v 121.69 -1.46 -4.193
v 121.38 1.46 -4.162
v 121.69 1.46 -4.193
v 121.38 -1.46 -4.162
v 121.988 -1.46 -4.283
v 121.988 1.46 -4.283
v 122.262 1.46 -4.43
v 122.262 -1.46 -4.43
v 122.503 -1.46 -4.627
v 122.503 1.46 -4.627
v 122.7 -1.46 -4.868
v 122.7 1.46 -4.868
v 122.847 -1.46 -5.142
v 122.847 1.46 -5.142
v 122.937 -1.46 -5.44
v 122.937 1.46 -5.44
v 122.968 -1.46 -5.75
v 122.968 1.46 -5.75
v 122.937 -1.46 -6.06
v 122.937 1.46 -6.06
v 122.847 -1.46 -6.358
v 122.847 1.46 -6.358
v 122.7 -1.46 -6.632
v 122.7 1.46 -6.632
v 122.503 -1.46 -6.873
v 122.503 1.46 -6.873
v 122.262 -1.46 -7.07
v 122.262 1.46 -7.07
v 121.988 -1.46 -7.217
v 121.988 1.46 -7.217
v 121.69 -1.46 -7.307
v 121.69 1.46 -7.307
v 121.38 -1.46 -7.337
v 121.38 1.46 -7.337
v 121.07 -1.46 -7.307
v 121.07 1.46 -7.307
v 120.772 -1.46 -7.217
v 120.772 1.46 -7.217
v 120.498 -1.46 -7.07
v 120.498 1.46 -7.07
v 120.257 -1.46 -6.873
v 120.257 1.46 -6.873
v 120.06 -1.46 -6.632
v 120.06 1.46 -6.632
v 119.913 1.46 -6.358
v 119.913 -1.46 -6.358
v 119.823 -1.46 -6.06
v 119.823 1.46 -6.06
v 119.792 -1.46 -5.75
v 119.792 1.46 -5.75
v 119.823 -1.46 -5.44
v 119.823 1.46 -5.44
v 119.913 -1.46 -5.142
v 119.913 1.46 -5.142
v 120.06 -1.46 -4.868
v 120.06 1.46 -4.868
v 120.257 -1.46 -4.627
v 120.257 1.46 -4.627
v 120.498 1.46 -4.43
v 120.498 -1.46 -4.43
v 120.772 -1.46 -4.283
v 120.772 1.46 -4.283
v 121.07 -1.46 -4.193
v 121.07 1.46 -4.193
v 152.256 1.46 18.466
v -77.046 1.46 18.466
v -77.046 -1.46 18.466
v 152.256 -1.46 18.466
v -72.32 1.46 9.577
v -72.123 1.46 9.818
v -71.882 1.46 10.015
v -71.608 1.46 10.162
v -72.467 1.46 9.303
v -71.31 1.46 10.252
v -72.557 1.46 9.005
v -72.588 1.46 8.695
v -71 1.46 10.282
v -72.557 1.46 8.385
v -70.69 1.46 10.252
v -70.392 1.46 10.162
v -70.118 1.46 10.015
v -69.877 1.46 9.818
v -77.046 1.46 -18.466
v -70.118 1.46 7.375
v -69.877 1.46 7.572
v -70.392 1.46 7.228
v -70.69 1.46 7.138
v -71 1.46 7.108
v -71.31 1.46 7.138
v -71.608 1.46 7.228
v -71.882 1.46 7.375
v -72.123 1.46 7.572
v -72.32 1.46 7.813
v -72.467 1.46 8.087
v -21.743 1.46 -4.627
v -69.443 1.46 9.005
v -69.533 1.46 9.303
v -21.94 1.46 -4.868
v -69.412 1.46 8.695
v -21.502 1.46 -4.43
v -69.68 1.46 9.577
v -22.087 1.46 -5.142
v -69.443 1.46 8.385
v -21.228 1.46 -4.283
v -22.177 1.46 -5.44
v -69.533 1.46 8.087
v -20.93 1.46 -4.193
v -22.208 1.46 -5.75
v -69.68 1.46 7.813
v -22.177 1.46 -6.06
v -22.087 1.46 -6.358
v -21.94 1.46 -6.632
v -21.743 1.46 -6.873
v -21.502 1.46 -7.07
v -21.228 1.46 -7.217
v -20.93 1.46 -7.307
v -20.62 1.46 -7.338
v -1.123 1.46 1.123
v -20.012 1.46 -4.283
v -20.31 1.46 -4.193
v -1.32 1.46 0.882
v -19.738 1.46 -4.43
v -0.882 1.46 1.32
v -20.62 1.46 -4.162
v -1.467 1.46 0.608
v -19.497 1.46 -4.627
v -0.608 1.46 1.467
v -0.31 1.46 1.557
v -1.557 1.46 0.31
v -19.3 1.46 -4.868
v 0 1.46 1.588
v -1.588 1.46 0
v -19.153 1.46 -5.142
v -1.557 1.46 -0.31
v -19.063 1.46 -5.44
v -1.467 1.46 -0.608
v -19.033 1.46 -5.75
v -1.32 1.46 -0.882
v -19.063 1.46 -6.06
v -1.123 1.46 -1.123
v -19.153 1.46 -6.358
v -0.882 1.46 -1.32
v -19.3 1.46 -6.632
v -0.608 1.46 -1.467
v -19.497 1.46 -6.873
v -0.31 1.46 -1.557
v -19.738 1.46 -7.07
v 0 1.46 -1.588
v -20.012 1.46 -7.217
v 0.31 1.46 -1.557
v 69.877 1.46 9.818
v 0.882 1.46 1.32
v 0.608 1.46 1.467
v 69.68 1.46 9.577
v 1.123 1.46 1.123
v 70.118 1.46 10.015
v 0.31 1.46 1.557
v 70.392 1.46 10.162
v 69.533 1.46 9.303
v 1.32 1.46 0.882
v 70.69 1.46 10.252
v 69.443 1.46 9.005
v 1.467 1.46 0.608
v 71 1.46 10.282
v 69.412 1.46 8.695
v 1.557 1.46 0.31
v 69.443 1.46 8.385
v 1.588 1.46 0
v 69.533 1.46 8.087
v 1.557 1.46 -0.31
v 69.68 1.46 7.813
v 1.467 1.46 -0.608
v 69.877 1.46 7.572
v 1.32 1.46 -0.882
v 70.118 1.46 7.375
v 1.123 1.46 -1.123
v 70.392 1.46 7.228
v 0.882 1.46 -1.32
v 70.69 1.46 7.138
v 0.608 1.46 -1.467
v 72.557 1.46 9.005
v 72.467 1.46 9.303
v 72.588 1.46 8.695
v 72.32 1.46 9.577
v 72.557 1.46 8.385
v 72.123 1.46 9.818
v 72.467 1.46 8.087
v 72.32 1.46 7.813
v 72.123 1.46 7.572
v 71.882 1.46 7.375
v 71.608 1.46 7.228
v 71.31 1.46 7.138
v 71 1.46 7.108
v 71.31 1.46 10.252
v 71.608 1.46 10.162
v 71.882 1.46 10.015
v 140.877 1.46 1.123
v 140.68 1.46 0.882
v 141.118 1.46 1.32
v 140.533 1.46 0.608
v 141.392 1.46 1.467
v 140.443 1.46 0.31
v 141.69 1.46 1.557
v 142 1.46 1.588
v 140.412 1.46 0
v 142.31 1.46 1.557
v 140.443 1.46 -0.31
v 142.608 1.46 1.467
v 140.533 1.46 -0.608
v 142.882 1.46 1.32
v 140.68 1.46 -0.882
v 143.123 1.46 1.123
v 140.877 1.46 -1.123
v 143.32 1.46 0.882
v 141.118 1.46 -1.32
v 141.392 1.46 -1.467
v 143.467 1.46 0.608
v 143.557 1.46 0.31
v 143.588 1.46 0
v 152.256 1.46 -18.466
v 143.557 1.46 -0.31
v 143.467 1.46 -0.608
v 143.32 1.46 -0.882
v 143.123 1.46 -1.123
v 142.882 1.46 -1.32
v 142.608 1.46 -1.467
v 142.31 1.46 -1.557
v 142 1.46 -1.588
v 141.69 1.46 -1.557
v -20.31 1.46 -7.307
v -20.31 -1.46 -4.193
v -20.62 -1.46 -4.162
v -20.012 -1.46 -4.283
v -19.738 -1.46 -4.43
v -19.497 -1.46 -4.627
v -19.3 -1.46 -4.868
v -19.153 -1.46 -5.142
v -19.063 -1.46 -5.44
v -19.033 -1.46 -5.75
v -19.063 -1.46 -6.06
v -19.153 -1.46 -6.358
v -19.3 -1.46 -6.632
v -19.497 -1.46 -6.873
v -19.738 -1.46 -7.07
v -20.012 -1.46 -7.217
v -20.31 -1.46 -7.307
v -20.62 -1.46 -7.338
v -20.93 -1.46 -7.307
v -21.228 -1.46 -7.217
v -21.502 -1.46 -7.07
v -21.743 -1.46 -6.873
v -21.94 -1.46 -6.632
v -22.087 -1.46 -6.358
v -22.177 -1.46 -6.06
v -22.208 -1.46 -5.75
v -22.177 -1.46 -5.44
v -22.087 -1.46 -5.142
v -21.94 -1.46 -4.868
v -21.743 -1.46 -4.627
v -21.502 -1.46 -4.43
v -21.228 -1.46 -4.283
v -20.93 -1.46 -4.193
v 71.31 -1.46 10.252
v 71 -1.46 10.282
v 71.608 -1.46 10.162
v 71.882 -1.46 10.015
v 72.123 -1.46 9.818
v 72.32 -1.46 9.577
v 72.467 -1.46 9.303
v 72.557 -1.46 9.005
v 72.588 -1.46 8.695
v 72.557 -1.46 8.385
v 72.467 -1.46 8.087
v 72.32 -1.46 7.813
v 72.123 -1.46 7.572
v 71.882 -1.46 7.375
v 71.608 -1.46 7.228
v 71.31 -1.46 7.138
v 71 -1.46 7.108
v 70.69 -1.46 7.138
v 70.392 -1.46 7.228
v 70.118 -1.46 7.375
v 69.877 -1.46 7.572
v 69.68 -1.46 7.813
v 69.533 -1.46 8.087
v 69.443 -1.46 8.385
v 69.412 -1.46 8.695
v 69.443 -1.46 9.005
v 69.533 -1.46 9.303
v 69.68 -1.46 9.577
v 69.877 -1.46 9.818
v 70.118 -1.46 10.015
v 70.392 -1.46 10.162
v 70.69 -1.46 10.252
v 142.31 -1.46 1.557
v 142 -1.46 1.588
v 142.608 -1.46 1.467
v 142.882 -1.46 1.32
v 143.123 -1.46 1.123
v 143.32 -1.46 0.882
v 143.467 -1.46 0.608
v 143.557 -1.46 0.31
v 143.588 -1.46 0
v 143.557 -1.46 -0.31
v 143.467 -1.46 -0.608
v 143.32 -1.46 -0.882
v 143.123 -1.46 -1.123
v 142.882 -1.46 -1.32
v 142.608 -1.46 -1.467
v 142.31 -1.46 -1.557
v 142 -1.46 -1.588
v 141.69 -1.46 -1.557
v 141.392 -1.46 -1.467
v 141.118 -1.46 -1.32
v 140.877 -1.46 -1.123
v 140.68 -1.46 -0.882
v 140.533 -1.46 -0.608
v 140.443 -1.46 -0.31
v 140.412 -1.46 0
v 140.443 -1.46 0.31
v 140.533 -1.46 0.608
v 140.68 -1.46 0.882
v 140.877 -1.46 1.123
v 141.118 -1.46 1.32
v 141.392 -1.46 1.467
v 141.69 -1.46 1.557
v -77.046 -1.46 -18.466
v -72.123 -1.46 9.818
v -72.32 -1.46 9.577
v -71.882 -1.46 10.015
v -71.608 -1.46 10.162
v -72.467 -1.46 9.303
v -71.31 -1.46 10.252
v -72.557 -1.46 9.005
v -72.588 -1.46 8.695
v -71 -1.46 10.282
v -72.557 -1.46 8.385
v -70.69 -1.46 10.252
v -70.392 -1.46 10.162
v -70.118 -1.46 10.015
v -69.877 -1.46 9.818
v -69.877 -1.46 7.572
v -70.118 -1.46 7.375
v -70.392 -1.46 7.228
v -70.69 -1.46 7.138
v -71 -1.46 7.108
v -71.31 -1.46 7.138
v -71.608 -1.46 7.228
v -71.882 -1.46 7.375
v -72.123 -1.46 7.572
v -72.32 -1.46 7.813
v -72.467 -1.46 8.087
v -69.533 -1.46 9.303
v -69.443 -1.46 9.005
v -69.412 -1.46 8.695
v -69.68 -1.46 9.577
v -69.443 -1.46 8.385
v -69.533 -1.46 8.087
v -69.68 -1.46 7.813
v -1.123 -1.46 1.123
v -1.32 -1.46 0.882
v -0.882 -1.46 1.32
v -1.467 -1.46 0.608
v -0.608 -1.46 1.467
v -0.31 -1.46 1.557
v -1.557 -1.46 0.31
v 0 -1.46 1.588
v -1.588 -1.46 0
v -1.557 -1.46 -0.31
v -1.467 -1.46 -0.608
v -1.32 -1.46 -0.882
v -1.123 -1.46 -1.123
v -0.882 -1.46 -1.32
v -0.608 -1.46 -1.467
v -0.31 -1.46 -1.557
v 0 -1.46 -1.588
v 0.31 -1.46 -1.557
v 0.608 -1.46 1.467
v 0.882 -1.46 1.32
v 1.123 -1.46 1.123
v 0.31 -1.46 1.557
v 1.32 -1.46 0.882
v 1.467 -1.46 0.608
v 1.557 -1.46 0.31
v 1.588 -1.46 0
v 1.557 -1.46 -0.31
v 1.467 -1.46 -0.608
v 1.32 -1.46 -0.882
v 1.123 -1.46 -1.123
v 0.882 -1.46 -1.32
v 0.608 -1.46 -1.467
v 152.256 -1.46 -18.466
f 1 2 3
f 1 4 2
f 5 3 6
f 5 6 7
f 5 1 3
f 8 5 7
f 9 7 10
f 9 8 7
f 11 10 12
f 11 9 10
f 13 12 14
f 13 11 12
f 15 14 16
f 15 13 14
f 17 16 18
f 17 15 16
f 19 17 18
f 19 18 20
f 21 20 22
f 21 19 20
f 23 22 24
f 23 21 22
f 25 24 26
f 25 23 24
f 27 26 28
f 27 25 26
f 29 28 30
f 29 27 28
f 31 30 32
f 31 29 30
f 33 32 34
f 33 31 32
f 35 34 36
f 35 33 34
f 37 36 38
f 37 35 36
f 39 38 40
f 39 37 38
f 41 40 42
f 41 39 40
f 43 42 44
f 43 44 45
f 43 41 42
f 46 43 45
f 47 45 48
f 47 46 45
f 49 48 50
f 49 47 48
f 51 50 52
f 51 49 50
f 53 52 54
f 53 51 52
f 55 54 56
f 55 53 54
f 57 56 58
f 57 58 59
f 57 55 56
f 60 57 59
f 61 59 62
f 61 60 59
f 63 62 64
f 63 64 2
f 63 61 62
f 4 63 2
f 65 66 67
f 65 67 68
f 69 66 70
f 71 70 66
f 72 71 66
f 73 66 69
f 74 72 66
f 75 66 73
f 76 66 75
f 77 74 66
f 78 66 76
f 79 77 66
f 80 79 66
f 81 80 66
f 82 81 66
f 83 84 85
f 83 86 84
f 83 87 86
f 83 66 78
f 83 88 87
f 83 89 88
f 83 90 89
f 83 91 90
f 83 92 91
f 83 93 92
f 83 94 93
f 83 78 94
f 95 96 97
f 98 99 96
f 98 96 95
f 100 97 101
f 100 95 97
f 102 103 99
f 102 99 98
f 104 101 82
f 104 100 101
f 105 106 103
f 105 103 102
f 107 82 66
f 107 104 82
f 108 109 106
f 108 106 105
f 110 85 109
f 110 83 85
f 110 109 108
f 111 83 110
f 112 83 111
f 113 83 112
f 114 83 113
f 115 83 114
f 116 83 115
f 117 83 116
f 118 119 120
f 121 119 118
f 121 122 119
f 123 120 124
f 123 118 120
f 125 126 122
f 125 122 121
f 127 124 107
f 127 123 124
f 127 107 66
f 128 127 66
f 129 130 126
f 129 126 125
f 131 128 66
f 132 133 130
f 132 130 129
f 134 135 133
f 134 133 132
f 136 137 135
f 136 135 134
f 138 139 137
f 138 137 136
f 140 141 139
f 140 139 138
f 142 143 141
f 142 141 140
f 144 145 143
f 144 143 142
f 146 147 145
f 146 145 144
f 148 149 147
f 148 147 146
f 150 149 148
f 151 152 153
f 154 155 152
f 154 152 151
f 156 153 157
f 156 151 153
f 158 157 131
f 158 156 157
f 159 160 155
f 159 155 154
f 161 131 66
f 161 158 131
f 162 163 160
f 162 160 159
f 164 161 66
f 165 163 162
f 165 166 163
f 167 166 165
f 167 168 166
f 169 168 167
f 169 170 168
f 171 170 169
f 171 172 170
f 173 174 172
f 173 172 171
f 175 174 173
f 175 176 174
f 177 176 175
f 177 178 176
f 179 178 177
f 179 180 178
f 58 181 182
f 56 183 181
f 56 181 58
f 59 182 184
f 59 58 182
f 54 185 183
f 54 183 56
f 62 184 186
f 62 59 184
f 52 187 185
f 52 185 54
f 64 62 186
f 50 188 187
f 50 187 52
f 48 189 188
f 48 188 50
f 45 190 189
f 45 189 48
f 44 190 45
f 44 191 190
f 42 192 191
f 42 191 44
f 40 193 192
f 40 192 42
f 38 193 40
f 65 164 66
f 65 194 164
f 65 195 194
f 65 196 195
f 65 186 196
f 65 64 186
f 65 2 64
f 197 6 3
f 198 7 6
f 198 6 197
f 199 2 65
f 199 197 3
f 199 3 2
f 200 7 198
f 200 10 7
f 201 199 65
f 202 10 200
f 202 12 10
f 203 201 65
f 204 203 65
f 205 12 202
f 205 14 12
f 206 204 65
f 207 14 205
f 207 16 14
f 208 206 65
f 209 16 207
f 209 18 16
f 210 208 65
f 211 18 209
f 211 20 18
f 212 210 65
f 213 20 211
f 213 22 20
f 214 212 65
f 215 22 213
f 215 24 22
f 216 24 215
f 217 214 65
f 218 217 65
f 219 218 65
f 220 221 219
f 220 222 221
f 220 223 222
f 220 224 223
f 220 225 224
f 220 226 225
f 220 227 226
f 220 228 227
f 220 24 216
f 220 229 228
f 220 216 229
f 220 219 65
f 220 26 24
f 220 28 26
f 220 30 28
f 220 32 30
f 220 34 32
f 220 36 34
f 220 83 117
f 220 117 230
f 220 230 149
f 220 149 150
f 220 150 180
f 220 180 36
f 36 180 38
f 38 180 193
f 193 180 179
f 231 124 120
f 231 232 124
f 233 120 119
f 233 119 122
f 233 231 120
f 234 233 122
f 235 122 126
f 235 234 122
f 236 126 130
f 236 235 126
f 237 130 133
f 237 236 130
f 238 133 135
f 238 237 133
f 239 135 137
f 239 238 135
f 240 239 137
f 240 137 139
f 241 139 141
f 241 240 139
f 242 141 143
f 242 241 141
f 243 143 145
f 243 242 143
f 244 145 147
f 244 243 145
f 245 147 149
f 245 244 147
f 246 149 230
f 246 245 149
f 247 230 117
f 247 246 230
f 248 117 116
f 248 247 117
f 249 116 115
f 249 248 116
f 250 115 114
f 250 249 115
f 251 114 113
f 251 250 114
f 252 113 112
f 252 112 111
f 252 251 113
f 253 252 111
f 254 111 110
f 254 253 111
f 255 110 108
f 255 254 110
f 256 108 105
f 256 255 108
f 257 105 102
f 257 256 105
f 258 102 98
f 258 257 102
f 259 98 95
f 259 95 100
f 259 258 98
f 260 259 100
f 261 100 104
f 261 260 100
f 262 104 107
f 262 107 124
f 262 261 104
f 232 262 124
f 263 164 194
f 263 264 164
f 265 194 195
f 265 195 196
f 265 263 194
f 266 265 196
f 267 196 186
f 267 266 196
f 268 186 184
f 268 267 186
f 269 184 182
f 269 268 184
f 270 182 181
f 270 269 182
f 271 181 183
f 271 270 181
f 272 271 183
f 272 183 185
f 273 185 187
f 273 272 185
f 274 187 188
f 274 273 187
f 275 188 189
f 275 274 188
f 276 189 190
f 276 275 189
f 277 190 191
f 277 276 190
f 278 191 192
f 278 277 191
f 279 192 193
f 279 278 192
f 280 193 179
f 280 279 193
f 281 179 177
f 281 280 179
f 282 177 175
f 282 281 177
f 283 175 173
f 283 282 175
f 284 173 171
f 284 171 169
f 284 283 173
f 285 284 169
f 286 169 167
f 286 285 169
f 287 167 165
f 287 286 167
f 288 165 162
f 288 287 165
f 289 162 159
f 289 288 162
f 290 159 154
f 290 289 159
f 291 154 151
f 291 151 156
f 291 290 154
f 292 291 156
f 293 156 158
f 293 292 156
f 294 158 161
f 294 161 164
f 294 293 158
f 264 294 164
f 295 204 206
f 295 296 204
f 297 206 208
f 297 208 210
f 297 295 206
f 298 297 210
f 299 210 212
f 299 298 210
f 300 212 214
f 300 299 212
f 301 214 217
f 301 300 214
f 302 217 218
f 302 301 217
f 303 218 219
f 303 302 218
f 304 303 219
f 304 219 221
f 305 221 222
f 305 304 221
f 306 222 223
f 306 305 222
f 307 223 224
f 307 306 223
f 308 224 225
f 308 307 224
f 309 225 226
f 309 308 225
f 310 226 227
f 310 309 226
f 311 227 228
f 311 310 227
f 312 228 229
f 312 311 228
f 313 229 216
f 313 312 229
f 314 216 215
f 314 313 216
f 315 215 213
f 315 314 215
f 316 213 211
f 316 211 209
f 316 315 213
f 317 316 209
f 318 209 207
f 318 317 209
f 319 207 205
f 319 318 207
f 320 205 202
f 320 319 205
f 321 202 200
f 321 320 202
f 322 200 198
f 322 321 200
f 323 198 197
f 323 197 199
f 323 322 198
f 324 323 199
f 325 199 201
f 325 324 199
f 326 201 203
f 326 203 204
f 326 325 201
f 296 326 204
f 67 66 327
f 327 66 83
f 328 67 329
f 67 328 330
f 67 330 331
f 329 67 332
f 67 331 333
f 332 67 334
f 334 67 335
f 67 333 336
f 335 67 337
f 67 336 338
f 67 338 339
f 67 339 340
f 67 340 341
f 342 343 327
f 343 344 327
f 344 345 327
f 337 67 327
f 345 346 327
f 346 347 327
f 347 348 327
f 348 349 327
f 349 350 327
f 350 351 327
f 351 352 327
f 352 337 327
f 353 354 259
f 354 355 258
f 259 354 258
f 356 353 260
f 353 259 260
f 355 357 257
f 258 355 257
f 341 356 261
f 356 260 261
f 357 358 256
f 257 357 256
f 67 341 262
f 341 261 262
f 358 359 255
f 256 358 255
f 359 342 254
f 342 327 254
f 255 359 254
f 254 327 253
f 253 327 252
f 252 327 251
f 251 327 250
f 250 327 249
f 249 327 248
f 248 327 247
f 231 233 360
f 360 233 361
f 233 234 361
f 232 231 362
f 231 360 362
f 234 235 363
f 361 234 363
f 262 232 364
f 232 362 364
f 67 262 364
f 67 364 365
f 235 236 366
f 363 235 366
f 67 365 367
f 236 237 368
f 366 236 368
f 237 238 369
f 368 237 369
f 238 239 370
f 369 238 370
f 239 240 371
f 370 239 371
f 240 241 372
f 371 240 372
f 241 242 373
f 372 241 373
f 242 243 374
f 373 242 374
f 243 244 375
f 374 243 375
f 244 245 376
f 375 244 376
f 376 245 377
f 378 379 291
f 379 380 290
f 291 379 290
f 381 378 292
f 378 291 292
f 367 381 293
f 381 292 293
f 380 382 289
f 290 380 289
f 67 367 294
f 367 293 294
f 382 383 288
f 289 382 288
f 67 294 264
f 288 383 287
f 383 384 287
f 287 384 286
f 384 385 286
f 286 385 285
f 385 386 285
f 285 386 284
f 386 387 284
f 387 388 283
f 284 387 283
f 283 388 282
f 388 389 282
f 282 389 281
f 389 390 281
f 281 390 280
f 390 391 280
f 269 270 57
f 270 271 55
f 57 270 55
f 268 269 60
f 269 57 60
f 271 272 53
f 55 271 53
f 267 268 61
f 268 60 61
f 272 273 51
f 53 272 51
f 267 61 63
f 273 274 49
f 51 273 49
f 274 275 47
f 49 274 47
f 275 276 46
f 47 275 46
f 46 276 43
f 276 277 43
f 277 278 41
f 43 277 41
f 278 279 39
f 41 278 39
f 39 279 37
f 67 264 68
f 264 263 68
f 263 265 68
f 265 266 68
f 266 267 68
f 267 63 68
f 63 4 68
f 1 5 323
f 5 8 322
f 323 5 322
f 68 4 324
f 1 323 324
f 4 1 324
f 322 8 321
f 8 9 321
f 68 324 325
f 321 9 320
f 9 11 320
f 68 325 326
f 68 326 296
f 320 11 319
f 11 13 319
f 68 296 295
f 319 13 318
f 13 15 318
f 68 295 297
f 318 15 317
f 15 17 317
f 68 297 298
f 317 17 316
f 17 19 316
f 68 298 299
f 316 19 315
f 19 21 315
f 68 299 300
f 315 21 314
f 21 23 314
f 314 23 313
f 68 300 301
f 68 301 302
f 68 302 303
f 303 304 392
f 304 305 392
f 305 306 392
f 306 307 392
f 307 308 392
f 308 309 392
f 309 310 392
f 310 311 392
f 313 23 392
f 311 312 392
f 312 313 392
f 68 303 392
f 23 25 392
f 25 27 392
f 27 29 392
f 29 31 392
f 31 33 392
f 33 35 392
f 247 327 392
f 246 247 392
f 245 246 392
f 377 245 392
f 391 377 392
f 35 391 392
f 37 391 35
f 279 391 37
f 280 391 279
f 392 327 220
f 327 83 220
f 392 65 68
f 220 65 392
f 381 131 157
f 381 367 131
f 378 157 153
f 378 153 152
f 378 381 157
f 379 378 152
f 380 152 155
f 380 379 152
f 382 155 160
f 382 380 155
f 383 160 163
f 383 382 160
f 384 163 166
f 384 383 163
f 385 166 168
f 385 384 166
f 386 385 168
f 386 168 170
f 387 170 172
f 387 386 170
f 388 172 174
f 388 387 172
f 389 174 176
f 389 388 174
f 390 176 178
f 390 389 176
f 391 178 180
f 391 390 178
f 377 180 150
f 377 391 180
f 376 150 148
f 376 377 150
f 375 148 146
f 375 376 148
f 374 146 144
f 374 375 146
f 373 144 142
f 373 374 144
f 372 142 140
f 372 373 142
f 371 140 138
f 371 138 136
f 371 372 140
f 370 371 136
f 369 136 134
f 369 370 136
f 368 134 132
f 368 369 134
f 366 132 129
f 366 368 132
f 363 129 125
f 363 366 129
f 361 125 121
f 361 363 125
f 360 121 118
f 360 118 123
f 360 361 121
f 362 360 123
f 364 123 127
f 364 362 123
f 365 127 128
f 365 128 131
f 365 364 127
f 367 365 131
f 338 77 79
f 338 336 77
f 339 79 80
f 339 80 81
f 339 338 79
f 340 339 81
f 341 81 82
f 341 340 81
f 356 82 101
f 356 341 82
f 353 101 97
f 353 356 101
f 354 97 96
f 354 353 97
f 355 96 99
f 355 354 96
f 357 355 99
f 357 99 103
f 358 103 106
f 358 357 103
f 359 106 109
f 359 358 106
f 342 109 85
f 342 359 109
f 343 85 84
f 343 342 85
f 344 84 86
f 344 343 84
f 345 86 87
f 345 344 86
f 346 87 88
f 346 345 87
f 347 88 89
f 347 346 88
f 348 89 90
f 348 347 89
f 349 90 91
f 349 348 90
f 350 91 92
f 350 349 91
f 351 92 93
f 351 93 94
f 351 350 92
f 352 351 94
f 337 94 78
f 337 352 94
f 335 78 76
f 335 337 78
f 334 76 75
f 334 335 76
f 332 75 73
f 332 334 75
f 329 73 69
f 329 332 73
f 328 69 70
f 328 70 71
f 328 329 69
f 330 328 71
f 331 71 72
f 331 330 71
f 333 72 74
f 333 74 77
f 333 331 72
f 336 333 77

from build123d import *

# Parameters (mm, degrees)
SKETCH1_W           = 229.301766186
SKETCH1_H           = 36.931173376
SKETCH1_R           = 1.5875
BOSS_EXTRUDE1_DEPTH = 1.4605


with BuildPart() as part:
    # Sketch1 → Boss-Extrude1 (new, symmetric)
    with BuildSketch(Plane(origin=(0, 0, 0), x_dir=(1, 0, 0), z_dir=(0, 1, 0))):
        with Locations((37.605218443, 0)):
            Rectangle(SKETCH1_W, SKETCH1_H)
        with Locations(Location((-71, -8.695, 0), (0, 0, 270))):
            Circle(SKETCH1_R, mode=Mode.SUBTRACT)
        with Locations(Location((71, -8.695, 0), (0, 0, 270))):
            Circle(SKETCH1_R, mode=Mode.SUBTRACT)
        with Locations(Location((0, 0, 0), (0, 0, 270))):
            Circle(SKETCH1_R, mode=Mode.SUBTRACT)
        with Locations(Location((-20.62, 5.75, 0), (0, 0, 270))):
            Circle(SKETCH1_R, mode=Mode.SUBTRACT)
        with Locations(Location((142, 0, 0), (0, 0, 270))):
            Circle(SKETCH1_R, mode=Mode.SUBTRACT)
        with Locations(Location((121.38, 5.74999993, 0), (0, 0, 270))):
            Circle(SKETCH1_R, mode=Mode.SUBTRACT)
    extrude(amount=BOSS_EXTRUDE1_DEPTH, both=True)


solid = part.part
